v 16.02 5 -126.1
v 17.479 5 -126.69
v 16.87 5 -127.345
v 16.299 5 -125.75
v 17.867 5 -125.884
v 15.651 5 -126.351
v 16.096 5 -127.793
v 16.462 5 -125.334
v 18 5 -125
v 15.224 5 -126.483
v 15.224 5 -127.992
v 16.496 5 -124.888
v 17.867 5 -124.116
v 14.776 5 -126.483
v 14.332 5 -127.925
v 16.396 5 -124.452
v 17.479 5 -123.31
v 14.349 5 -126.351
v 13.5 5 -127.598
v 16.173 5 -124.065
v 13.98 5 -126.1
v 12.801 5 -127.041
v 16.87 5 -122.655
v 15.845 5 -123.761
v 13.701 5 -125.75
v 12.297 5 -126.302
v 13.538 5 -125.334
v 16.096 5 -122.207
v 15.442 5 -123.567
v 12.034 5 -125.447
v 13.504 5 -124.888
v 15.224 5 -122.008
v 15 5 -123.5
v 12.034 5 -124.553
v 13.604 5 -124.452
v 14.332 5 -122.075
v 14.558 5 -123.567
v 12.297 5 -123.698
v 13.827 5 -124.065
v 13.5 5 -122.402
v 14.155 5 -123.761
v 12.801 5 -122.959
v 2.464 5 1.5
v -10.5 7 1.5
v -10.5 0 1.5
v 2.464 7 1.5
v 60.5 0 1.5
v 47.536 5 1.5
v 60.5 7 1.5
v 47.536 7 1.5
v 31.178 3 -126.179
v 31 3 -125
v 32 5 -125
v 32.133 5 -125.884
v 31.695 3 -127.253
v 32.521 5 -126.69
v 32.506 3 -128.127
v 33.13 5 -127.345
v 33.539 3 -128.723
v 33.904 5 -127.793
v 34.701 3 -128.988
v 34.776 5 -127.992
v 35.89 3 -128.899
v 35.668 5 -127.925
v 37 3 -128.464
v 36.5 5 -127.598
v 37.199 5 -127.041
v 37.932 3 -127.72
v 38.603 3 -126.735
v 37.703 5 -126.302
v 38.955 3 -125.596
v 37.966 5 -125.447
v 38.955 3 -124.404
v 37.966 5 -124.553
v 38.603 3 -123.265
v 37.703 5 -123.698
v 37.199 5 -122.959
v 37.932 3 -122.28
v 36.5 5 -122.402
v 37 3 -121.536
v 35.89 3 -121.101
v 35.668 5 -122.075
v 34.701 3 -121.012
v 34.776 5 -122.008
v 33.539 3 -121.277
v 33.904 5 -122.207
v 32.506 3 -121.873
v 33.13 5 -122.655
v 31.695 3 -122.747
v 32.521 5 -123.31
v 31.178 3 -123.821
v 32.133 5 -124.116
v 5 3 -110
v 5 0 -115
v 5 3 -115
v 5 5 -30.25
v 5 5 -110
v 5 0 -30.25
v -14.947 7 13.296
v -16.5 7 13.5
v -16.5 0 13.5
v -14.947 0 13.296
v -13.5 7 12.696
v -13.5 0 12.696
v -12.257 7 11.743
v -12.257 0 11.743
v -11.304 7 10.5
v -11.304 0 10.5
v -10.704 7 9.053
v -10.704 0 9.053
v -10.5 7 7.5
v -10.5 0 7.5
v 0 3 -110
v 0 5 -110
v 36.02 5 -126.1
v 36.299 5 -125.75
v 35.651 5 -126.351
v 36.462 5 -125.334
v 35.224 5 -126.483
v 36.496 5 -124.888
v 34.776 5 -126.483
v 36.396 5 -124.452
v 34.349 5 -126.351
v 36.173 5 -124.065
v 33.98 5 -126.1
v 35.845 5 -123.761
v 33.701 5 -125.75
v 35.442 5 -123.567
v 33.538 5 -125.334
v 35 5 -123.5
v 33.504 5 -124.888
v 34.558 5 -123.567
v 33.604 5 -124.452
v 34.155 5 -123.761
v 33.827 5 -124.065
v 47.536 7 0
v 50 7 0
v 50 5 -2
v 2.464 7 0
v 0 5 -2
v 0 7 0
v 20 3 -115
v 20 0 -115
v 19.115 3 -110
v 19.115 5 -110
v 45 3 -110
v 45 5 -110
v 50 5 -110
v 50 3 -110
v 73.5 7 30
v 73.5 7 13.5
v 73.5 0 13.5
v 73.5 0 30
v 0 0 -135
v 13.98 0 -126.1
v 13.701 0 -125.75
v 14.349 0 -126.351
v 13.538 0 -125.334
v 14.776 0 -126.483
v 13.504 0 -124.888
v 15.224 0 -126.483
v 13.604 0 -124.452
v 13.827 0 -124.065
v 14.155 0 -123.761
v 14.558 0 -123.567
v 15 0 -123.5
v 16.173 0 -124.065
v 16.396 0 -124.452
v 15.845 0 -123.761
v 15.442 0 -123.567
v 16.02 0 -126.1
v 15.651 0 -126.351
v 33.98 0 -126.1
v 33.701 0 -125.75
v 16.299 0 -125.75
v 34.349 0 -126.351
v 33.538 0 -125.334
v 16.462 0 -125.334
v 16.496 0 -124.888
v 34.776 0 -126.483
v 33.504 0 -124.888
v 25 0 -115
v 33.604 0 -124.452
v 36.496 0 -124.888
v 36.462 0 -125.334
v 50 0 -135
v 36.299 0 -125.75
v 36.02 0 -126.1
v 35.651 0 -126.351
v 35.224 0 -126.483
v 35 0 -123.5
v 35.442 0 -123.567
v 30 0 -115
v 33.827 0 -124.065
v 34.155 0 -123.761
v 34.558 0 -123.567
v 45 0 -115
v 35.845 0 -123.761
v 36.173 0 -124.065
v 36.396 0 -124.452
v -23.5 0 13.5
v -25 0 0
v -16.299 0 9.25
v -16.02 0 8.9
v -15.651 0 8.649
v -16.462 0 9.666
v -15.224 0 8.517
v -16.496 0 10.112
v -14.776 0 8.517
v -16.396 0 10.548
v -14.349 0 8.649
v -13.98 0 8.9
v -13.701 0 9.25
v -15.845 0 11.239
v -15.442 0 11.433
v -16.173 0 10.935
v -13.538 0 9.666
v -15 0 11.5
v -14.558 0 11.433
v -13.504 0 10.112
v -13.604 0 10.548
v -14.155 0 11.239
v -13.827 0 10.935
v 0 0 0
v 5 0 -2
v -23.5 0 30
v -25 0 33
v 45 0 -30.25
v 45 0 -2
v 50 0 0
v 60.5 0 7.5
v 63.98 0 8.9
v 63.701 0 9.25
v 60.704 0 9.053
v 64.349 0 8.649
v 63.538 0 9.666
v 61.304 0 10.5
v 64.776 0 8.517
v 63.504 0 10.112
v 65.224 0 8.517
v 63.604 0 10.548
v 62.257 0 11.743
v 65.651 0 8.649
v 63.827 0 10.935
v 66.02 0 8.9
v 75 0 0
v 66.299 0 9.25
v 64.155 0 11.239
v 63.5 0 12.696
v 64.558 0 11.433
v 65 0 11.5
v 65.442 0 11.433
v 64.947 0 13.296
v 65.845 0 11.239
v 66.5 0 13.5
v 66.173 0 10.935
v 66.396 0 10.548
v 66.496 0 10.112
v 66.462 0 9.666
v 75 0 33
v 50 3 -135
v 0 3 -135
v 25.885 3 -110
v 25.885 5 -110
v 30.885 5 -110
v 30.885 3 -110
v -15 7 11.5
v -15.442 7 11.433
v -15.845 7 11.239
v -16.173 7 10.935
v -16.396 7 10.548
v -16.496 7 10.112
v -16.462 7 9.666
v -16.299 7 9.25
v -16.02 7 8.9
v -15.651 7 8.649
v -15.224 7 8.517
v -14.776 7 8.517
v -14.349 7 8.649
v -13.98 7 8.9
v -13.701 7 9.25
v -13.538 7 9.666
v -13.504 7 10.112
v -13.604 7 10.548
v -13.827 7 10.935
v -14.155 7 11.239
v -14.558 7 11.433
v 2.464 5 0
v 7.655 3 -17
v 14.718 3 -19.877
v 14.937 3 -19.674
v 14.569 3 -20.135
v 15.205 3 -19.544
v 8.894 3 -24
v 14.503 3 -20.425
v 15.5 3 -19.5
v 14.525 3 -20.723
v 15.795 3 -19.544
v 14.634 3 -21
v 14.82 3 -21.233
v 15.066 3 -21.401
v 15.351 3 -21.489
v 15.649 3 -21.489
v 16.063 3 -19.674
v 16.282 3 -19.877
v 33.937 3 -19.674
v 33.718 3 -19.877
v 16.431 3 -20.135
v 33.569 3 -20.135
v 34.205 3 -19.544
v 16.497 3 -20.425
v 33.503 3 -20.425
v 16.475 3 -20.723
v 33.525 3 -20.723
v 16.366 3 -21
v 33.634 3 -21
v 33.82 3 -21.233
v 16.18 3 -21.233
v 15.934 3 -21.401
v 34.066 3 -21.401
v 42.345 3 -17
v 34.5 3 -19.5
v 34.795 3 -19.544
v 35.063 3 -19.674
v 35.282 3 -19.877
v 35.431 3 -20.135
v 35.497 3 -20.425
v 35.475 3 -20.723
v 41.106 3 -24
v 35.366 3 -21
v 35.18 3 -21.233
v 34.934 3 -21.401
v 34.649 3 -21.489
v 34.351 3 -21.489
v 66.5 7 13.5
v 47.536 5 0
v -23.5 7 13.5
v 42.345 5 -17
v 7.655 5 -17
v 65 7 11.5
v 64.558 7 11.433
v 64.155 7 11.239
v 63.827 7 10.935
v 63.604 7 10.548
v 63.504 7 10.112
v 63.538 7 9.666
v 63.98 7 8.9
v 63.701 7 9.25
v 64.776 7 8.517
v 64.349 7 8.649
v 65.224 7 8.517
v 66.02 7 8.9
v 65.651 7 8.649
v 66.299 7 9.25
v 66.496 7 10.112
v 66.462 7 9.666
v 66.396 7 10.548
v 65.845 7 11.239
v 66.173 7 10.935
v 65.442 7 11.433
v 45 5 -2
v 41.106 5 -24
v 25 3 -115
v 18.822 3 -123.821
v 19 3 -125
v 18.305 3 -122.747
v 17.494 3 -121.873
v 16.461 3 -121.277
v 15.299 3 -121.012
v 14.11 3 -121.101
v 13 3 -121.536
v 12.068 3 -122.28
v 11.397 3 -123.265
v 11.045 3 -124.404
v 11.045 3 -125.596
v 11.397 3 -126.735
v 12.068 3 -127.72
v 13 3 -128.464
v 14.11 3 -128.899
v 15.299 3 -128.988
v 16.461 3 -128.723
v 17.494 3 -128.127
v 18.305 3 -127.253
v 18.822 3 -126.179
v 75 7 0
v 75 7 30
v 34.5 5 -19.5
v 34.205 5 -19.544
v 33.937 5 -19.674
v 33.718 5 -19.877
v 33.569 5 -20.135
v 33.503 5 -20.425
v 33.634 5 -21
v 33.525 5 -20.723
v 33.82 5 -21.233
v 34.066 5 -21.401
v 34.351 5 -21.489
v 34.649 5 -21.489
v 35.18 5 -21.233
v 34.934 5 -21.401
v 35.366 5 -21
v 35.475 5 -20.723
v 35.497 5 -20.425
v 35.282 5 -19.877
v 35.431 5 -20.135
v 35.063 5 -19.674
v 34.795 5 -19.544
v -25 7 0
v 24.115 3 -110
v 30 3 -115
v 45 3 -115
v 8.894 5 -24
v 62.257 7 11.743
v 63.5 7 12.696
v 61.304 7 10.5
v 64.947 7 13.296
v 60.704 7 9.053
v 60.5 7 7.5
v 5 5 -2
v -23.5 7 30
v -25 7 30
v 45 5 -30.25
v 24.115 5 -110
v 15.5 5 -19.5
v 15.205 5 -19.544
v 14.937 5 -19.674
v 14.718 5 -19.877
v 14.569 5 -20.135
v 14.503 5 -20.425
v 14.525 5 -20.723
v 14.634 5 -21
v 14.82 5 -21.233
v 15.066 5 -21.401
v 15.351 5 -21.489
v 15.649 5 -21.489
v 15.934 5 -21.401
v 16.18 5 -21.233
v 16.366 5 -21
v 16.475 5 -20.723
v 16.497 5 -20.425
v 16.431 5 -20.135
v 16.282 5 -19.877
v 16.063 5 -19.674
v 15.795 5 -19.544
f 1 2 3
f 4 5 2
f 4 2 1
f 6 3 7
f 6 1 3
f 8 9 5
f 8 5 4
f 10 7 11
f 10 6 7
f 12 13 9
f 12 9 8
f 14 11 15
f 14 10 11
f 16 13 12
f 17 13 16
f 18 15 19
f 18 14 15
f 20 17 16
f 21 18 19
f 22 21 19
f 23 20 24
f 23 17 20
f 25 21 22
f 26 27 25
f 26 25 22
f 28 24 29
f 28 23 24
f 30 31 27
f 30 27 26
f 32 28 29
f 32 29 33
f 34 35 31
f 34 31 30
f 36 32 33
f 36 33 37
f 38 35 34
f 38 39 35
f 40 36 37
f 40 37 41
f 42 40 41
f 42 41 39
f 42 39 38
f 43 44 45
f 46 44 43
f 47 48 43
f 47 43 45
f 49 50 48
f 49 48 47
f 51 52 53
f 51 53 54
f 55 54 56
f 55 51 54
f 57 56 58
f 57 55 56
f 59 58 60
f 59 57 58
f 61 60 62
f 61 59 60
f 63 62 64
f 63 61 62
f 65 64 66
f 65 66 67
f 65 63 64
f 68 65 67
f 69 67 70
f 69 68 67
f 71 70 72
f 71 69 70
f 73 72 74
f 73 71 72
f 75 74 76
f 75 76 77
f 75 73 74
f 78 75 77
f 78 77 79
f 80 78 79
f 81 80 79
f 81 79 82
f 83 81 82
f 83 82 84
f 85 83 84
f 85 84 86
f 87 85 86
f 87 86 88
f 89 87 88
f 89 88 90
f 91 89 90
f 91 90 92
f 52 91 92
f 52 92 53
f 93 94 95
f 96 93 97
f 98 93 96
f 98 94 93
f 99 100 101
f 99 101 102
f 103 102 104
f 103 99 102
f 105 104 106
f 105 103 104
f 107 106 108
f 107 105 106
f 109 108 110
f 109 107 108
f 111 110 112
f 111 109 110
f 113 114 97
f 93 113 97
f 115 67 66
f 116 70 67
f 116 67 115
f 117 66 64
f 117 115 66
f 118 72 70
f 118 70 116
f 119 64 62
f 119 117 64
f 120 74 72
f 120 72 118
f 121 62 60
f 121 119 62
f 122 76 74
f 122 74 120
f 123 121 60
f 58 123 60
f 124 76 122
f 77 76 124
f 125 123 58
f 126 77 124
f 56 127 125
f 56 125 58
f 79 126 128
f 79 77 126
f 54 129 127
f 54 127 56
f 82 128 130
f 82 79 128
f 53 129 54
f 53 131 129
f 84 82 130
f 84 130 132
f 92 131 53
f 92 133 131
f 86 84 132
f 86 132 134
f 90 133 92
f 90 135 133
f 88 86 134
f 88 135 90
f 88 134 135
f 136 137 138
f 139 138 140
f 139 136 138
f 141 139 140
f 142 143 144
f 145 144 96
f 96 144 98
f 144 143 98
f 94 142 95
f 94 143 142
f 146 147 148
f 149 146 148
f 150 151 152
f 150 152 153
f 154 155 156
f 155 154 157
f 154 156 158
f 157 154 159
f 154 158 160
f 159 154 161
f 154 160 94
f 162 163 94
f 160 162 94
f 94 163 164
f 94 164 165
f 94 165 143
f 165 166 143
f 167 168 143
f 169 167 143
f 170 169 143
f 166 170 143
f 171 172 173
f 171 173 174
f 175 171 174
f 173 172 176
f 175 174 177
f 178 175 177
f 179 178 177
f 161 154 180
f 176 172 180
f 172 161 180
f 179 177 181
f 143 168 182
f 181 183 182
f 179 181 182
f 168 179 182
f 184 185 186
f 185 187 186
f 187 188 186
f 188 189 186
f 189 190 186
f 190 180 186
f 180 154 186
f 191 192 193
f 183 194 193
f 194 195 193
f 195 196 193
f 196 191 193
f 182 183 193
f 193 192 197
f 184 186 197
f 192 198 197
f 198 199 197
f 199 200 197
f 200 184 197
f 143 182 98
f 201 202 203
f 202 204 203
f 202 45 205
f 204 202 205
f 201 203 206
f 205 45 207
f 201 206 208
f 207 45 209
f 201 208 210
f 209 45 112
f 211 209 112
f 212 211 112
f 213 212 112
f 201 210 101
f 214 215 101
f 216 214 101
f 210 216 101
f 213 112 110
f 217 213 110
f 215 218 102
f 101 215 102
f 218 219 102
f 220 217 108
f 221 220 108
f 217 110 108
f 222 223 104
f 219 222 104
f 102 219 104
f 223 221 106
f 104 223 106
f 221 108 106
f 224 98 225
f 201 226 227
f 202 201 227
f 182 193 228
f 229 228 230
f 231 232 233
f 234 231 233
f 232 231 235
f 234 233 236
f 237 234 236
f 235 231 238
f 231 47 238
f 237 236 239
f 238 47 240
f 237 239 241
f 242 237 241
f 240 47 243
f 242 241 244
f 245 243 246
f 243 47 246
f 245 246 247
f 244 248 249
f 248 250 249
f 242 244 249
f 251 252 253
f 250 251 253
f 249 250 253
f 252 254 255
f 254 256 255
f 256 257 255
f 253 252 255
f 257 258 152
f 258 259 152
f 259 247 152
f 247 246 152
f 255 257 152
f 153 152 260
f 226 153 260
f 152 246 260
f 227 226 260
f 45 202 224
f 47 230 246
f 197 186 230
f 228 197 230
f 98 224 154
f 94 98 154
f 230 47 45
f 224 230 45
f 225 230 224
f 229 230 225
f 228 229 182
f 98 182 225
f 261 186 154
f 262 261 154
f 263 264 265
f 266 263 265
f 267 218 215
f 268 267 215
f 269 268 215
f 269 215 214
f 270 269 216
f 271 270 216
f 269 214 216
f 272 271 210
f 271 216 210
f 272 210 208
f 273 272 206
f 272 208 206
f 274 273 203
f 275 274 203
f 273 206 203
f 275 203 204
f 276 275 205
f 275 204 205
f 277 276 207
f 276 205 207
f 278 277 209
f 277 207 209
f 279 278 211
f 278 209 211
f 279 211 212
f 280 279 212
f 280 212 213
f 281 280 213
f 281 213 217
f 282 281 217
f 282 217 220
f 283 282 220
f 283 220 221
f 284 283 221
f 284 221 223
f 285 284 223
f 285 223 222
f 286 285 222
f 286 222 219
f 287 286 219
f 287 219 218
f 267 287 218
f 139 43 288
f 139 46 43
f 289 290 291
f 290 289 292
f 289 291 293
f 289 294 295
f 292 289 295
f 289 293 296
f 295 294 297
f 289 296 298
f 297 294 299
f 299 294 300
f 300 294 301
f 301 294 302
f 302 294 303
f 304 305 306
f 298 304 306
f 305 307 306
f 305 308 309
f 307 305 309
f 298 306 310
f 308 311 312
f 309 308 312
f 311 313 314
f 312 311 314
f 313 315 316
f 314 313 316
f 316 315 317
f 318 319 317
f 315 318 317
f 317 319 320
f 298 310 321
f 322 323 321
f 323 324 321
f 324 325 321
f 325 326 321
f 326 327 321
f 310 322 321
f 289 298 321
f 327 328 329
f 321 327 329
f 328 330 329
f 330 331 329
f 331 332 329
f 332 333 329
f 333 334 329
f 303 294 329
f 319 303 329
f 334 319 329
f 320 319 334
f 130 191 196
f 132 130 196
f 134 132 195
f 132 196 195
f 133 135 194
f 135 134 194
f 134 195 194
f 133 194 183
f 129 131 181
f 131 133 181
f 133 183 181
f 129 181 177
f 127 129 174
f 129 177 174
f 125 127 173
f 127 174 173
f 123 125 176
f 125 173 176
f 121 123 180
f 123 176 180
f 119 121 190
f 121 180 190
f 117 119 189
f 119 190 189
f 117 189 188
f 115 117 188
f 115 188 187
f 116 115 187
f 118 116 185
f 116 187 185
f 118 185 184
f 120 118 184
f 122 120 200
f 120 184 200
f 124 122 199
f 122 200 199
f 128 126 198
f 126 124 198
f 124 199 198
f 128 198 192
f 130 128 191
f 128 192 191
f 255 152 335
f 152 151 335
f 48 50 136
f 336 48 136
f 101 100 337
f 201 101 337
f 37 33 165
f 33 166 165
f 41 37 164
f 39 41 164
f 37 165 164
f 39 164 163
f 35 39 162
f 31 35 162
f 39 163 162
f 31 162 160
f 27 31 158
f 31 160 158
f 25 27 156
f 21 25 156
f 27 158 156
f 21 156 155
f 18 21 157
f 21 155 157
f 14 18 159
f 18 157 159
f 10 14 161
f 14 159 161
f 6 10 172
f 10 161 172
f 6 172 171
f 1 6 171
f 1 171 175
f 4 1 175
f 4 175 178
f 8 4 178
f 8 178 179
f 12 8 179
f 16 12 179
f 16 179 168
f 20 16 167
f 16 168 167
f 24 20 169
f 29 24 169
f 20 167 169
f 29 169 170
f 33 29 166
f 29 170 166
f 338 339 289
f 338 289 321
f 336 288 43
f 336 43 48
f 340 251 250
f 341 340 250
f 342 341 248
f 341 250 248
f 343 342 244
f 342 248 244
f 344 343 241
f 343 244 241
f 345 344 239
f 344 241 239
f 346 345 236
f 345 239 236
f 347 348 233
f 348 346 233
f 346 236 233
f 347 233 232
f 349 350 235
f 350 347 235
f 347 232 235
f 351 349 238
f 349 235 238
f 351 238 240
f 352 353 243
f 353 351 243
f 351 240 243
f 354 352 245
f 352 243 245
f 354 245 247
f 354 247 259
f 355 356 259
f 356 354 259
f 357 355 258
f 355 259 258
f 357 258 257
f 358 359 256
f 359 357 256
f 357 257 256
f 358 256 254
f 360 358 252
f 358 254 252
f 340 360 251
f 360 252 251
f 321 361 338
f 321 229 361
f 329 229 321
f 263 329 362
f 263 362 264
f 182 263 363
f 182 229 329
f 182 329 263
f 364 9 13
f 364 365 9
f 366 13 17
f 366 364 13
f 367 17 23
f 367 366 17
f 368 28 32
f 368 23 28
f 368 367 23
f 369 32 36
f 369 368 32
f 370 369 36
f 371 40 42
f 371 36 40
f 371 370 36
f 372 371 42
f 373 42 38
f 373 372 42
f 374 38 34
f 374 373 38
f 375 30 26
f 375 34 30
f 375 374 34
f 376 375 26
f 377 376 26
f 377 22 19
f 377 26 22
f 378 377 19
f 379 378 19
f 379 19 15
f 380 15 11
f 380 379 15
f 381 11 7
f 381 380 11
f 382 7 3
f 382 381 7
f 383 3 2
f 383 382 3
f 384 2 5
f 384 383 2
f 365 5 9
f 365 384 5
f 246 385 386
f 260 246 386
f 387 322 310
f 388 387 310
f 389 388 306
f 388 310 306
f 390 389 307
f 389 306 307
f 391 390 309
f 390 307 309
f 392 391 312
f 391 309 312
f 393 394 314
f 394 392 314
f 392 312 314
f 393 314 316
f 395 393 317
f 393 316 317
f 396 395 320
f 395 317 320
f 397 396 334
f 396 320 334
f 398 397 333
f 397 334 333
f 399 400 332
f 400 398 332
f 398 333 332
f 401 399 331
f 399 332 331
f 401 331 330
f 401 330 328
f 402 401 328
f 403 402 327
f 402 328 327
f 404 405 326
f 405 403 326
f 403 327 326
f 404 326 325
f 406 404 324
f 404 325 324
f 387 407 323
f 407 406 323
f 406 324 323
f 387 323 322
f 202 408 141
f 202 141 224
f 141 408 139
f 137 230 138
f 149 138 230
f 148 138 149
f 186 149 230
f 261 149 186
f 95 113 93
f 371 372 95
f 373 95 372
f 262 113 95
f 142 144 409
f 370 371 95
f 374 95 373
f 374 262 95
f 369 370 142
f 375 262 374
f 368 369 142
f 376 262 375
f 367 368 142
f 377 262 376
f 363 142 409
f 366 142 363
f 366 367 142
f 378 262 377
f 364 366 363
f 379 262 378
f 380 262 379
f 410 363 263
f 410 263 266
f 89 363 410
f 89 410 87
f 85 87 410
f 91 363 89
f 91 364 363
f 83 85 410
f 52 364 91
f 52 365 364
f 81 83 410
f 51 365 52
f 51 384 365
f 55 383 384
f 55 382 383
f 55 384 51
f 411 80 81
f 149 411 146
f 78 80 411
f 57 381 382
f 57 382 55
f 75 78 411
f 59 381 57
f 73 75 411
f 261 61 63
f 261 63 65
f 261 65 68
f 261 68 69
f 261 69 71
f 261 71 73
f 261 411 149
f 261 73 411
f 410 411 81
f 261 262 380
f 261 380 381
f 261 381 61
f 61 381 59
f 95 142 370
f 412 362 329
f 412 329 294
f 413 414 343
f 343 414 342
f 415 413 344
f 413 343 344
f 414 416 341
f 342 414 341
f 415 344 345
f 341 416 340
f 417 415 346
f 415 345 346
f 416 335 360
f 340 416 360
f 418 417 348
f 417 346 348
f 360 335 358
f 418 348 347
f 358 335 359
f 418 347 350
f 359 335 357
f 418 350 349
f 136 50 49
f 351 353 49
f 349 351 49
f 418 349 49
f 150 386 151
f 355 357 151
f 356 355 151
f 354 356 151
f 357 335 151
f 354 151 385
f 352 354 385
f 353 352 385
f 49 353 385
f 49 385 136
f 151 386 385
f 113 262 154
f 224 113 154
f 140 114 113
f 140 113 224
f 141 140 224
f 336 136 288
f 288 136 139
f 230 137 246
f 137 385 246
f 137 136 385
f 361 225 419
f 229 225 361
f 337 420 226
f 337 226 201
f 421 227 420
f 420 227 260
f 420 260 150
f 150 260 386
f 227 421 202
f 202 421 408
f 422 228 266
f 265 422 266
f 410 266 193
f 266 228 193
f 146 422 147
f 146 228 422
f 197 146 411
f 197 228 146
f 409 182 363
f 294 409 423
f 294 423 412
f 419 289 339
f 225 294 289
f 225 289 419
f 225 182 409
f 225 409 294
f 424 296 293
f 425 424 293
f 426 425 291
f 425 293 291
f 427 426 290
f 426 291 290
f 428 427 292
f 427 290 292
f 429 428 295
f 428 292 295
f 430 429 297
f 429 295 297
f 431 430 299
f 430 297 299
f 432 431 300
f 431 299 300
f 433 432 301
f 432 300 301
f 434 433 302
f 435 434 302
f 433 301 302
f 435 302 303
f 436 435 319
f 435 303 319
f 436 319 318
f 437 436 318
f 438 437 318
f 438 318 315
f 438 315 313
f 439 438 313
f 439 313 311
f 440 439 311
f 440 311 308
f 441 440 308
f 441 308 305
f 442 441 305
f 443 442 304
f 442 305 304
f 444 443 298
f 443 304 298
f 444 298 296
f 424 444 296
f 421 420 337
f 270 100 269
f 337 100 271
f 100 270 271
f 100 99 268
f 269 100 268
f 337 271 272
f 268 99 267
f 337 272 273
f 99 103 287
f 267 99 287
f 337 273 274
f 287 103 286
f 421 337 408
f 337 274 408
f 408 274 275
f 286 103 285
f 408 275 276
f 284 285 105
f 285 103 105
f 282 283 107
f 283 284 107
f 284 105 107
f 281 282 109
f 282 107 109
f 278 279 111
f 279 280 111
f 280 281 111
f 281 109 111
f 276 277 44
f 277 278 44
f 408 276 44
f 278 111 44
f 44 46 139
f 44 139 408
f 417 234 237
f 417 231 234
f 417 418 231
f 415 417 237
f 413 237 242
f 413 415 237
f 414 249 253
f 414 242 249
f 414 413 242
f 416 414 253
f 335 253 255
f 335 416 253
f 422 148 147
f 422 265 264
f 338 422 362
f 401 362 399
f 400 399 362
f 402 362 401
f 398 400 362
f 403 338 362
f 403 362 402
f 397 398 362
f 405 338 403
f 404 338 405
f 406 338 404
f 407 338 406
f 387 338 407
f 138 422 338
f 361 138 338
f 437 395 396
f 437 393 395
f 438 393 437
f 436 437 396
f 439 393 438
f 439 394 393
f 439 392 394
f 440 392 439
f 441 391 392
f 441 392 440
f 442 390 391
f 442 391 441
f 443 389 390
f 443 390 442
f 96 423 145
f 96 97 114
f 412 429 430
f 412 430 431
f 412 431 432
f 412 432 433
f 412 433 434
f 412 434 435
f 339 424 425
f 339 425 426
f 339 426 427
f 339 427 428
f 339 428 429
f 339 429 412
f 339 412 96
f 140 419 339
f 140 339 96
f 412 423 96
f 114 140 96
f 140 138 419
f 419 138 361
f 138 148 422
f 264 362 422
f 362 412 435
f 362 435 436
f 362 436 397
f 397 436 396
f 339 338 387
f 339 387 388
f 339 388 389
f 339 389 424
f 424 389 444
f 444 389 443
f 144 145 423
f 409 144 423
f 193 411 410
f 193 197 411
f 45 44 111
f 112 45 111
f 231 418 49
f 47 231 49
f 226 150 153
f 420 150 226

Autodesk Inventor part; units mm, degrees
ref_plane "YZ Plane" through (0, 0, 0) normal (1, 0, 0) x (0, 1, 0)
ref_plane "XZ Plane" through (0, 0, 0) normal (0, 1, 0) x (-1, 0, 0)
sketch "Szkic1" plane through (0, 0, 0) normal (0, 1, 0) x (-1, 0, 0)
  line L0 (0, 0) -> (-25, 0)
  line L1 (-25, 0) -> (-25, -135)
  line L2 (-25, -135) -> (0, -135)
  line L3 (0, -135) -> (0, 0)
  line L4 (-5, -2) -> (-25, -2)
  line L5 (-25, -2) -> (-25, -115)
  line L6 (-25, -115) -> (-5, -115)
  line L7 (-5, -115) -> (-5, -2)
  line L8 (-25, -115) -> (-5, -2)
  line L9 (-20, -115) -> (-5, -30.25)
  line L10 (-5, -30.25) -> (-5, -2)
  line L11 (-25, -115) -> (-20, -115)
  dimension "d0" = 25
  dimension "d1" = 135
  dimension "d2" = 5
  dimension "d3" = 20
  dimension "d4" = 2
  dimension "d7" = 5
extrude "Wyciągnięcie proste2" add sketch "Szkic1" along normal blind 5 contours L3 L2 L1 L6 L7 L4 L0 | L8 L7 L9 L6
sketch "Szkic2" plane through (25, 0, 0) normal (1, 0, 0) x (0, 0, -1)
  line L0 (0, 0) -> (-33, 0)
  line L1 (-33, 0) -> (-33, 7)
  line L2 (-33, 7) -> (0, 7)
  line L3 (0, 7) -> (0, 0)
  line L4 (-33, 0) -> (-30, 7)
  dimension "d10" = 33
  dimension "d11" = 7
  dimension "d12" = 30
extrude "Wyciągnięcie proste3" add sketch "Szkic2" against normal blind 50 contours L0 L4 L2 L3
sketch "Szkic3" plane through (25, 7, 30) normal (0, 1, 0) x (1, 0, 0)
  line L0 (0, 0) -> (-50, 0) projected
  line L1 (0, 0) -> (-48.5, 0)
  line L2 (-48.5, 0) -> (-48.5, 28.5)
  line L3 (-48.5, 28.5) -> (0, 28.5)
  line L4 (-50, 0) -> (-50, 30) projected
  line L5 (-48.5, 28.5) -> (-41.5, 28.5)
  line L6 (-41.5, 28.5) -> (-41.5, 16.5)
  line L7 (-41.5, 16.5) -> (-48.5, 16.5)
  line L8 (-48.5, 16.5) -> (-48.5, 28.5)
  circle A0 centre (-41.5, 22.5) radius 6
  line L9 (-35.5, 22.5) -> (-41.5, 22.5)
  line L10 (-41.5, 22.5) -> (-41.5, 28.5)
  line L11 (-41.5, 28.5) -> (-35.5, 28.5)
  line L12 (-35.5, 28.5) -> (-35.5, 22.5)
  line L13 (0, 30) -> (-50, 30) projected
  line L14 (0, 30) -> (0, 0) projected
  line L15 (-19, 28.5) -> (-7, 28.5) construction
  line L16 (-22.5355, 28.5) -> (-19, 28.5)
  line L17 (-7, 28.5) -> (-5, 28.5)
  line L18 (-7, 0) -> (-5, 0)
  point P0 (-25, 30)
  dimension "d16" = 1.5
  dimension "d19" = 13
  dimension "d20" = 12
  dimension "d66" = 1.5
extrude "Wyciągnięcie proste4" cut sketch "Szkic3" against normal up to next contours L0 L2 L7 A0 L12 L3 L14
sketch "Szkic4" plane through (0, 5, 0) normal (0, 1, 0) x (1, 0, 0)
  line L0 (0, 0) -> (0, 17) construction
  line L1 (0, 135) -> (0, 0) construction
  line L2 (0, 17) -> (25, 17)
  line L3 (25, 17) -> (25, 24)
  line L4 (25, 24) -> (0, 24)
  line L5 (0, 24) -> (0, 17)
  dimension "d26" = 17
  dimension "d27" = 7
extrude "Wyciągnięcie proste5" add sketch "Szkic4" against normal blind 2
sketch "Szkic5" plane through (0, 5, 0) normal (0, 1, 0) x (1, 0, 0)
  line L0 (25, 115) -> (25, 135) projected
  line L1 (0, 135) -> (0, 0) projected
  line L2 (25, 135) -> (0, 135)
  line L3 (0, 135) -> (0, 110)
  line L4 (0, 110) -> (25, 110)
  line L5 (25, 110) -> (25, 135)
  circle A0 centre (15, 125) radius 3
  dimension "d30" = 25
  dimension "d31" = 6
  dimension "d32" = 10
  dimension "d33" = 10
extrude "Wyciągnięcie proste6" cut sketch "Szkic5" against normal blind 2
chamfer "Faza2" distance 2 distance2 1 1 edges at (12, 3, -125) measured on face at (17.3983, 3.6667, -123.1978)
chamfer "Faza3" distance 2 angle 45 1 edges at (12.5, 5, 0)
sketch "Szkic6" plane through (15, 5, -125) normal (0, 1, 0) x (1, 0, 0)
  point P0 (-15, -125)
  point P1 (0, 0)
hole "Otwór1" at (15, 5, -125) direction (0, -1, 0) diameter 3 end through all
sketch "Szkic7" plane through (-25, 7, 30) normal (0, 1, 0) x (1, 0, 0)
  line L0 (14.5, 28.5) -> (14.5, 22.5) construction
  line L1 (14.5, 28.5) -> (14.5, 20) construction
  line L2 (14.5, 20) -> (1.5, 20) construction
  line L3 (1.5, 16.5) -> (1.5, 0) construction
  line L4 (1.5, 20) -> (1.5, 16.5) construction
  line L5 (1.5, 20) -> (10, 20) construction
  point P0 (25, 30)
  point P1 (12.5, 27.5)
  dimension "d49" = 8.5
  dimension "d50" = 8.5
hole "Otwór2" at (-15, 7, 10) direction (0, -1, 0) diameter 3 end through all
sketch "Szkic8" plane through (0, 5, 0) normal (0, 1, 0) x (1, 0, 0)
  line L0 (25, 24) -> (25, 17) construction
  line L1 (25, 20.5) -> (15.5, 20.5) construction
  point P0 (0, 0)
  dimension "d58" = 9.5
hole "Otwór3" at (15.5, 5, -20.5) direction (0, -1, 0) diameter 2 end through all
ref_plane "Płaszczyzna konstrukcyjna1" through (25, 3, -61.25) normal (1, 0, 0) x (0, 0, 1)
mirror "Odbij1" about plane through (25, 3, -61.25) normal (1, 0, 0)
sketch "Szkic9" plane through (-25, 7, 30) normal (0, 1, 0) x (1, 0, 0)
  line L0 (14.5, 28.5) -> (85.5, 28.5) projected
  line L1 (27.4645, 28.5) -> (27.4645, 30)
  line L2 (72.5355, 28.5) -> (57, 12.9645) projected
  line L3 (72.5355, 28.5) -> (72.5355, 30)
  line L4 (75, 30) -> (25, 30) projected
  line L5 (27.4645, 30) -> (72.5355, 30)
  line L6 (27.4645, 28.5) -> (32.9645, 23)
  line L7 (27.4645, 28.5) -> (43, 12.9645) projected
  line L8 (32.9645, 23) -> (67.0355, 23)
  line L9 (85.5, 28.5) -> (14.5, 28.5) projected
  line L10 (72.5355, 28.5) -> (67.0355, 23)
  dimension "d71" = 7
extrude "Wyciągnięcie proste7" cut sketch "Szkic9" against normal blind 2
properties part number "lf2"
